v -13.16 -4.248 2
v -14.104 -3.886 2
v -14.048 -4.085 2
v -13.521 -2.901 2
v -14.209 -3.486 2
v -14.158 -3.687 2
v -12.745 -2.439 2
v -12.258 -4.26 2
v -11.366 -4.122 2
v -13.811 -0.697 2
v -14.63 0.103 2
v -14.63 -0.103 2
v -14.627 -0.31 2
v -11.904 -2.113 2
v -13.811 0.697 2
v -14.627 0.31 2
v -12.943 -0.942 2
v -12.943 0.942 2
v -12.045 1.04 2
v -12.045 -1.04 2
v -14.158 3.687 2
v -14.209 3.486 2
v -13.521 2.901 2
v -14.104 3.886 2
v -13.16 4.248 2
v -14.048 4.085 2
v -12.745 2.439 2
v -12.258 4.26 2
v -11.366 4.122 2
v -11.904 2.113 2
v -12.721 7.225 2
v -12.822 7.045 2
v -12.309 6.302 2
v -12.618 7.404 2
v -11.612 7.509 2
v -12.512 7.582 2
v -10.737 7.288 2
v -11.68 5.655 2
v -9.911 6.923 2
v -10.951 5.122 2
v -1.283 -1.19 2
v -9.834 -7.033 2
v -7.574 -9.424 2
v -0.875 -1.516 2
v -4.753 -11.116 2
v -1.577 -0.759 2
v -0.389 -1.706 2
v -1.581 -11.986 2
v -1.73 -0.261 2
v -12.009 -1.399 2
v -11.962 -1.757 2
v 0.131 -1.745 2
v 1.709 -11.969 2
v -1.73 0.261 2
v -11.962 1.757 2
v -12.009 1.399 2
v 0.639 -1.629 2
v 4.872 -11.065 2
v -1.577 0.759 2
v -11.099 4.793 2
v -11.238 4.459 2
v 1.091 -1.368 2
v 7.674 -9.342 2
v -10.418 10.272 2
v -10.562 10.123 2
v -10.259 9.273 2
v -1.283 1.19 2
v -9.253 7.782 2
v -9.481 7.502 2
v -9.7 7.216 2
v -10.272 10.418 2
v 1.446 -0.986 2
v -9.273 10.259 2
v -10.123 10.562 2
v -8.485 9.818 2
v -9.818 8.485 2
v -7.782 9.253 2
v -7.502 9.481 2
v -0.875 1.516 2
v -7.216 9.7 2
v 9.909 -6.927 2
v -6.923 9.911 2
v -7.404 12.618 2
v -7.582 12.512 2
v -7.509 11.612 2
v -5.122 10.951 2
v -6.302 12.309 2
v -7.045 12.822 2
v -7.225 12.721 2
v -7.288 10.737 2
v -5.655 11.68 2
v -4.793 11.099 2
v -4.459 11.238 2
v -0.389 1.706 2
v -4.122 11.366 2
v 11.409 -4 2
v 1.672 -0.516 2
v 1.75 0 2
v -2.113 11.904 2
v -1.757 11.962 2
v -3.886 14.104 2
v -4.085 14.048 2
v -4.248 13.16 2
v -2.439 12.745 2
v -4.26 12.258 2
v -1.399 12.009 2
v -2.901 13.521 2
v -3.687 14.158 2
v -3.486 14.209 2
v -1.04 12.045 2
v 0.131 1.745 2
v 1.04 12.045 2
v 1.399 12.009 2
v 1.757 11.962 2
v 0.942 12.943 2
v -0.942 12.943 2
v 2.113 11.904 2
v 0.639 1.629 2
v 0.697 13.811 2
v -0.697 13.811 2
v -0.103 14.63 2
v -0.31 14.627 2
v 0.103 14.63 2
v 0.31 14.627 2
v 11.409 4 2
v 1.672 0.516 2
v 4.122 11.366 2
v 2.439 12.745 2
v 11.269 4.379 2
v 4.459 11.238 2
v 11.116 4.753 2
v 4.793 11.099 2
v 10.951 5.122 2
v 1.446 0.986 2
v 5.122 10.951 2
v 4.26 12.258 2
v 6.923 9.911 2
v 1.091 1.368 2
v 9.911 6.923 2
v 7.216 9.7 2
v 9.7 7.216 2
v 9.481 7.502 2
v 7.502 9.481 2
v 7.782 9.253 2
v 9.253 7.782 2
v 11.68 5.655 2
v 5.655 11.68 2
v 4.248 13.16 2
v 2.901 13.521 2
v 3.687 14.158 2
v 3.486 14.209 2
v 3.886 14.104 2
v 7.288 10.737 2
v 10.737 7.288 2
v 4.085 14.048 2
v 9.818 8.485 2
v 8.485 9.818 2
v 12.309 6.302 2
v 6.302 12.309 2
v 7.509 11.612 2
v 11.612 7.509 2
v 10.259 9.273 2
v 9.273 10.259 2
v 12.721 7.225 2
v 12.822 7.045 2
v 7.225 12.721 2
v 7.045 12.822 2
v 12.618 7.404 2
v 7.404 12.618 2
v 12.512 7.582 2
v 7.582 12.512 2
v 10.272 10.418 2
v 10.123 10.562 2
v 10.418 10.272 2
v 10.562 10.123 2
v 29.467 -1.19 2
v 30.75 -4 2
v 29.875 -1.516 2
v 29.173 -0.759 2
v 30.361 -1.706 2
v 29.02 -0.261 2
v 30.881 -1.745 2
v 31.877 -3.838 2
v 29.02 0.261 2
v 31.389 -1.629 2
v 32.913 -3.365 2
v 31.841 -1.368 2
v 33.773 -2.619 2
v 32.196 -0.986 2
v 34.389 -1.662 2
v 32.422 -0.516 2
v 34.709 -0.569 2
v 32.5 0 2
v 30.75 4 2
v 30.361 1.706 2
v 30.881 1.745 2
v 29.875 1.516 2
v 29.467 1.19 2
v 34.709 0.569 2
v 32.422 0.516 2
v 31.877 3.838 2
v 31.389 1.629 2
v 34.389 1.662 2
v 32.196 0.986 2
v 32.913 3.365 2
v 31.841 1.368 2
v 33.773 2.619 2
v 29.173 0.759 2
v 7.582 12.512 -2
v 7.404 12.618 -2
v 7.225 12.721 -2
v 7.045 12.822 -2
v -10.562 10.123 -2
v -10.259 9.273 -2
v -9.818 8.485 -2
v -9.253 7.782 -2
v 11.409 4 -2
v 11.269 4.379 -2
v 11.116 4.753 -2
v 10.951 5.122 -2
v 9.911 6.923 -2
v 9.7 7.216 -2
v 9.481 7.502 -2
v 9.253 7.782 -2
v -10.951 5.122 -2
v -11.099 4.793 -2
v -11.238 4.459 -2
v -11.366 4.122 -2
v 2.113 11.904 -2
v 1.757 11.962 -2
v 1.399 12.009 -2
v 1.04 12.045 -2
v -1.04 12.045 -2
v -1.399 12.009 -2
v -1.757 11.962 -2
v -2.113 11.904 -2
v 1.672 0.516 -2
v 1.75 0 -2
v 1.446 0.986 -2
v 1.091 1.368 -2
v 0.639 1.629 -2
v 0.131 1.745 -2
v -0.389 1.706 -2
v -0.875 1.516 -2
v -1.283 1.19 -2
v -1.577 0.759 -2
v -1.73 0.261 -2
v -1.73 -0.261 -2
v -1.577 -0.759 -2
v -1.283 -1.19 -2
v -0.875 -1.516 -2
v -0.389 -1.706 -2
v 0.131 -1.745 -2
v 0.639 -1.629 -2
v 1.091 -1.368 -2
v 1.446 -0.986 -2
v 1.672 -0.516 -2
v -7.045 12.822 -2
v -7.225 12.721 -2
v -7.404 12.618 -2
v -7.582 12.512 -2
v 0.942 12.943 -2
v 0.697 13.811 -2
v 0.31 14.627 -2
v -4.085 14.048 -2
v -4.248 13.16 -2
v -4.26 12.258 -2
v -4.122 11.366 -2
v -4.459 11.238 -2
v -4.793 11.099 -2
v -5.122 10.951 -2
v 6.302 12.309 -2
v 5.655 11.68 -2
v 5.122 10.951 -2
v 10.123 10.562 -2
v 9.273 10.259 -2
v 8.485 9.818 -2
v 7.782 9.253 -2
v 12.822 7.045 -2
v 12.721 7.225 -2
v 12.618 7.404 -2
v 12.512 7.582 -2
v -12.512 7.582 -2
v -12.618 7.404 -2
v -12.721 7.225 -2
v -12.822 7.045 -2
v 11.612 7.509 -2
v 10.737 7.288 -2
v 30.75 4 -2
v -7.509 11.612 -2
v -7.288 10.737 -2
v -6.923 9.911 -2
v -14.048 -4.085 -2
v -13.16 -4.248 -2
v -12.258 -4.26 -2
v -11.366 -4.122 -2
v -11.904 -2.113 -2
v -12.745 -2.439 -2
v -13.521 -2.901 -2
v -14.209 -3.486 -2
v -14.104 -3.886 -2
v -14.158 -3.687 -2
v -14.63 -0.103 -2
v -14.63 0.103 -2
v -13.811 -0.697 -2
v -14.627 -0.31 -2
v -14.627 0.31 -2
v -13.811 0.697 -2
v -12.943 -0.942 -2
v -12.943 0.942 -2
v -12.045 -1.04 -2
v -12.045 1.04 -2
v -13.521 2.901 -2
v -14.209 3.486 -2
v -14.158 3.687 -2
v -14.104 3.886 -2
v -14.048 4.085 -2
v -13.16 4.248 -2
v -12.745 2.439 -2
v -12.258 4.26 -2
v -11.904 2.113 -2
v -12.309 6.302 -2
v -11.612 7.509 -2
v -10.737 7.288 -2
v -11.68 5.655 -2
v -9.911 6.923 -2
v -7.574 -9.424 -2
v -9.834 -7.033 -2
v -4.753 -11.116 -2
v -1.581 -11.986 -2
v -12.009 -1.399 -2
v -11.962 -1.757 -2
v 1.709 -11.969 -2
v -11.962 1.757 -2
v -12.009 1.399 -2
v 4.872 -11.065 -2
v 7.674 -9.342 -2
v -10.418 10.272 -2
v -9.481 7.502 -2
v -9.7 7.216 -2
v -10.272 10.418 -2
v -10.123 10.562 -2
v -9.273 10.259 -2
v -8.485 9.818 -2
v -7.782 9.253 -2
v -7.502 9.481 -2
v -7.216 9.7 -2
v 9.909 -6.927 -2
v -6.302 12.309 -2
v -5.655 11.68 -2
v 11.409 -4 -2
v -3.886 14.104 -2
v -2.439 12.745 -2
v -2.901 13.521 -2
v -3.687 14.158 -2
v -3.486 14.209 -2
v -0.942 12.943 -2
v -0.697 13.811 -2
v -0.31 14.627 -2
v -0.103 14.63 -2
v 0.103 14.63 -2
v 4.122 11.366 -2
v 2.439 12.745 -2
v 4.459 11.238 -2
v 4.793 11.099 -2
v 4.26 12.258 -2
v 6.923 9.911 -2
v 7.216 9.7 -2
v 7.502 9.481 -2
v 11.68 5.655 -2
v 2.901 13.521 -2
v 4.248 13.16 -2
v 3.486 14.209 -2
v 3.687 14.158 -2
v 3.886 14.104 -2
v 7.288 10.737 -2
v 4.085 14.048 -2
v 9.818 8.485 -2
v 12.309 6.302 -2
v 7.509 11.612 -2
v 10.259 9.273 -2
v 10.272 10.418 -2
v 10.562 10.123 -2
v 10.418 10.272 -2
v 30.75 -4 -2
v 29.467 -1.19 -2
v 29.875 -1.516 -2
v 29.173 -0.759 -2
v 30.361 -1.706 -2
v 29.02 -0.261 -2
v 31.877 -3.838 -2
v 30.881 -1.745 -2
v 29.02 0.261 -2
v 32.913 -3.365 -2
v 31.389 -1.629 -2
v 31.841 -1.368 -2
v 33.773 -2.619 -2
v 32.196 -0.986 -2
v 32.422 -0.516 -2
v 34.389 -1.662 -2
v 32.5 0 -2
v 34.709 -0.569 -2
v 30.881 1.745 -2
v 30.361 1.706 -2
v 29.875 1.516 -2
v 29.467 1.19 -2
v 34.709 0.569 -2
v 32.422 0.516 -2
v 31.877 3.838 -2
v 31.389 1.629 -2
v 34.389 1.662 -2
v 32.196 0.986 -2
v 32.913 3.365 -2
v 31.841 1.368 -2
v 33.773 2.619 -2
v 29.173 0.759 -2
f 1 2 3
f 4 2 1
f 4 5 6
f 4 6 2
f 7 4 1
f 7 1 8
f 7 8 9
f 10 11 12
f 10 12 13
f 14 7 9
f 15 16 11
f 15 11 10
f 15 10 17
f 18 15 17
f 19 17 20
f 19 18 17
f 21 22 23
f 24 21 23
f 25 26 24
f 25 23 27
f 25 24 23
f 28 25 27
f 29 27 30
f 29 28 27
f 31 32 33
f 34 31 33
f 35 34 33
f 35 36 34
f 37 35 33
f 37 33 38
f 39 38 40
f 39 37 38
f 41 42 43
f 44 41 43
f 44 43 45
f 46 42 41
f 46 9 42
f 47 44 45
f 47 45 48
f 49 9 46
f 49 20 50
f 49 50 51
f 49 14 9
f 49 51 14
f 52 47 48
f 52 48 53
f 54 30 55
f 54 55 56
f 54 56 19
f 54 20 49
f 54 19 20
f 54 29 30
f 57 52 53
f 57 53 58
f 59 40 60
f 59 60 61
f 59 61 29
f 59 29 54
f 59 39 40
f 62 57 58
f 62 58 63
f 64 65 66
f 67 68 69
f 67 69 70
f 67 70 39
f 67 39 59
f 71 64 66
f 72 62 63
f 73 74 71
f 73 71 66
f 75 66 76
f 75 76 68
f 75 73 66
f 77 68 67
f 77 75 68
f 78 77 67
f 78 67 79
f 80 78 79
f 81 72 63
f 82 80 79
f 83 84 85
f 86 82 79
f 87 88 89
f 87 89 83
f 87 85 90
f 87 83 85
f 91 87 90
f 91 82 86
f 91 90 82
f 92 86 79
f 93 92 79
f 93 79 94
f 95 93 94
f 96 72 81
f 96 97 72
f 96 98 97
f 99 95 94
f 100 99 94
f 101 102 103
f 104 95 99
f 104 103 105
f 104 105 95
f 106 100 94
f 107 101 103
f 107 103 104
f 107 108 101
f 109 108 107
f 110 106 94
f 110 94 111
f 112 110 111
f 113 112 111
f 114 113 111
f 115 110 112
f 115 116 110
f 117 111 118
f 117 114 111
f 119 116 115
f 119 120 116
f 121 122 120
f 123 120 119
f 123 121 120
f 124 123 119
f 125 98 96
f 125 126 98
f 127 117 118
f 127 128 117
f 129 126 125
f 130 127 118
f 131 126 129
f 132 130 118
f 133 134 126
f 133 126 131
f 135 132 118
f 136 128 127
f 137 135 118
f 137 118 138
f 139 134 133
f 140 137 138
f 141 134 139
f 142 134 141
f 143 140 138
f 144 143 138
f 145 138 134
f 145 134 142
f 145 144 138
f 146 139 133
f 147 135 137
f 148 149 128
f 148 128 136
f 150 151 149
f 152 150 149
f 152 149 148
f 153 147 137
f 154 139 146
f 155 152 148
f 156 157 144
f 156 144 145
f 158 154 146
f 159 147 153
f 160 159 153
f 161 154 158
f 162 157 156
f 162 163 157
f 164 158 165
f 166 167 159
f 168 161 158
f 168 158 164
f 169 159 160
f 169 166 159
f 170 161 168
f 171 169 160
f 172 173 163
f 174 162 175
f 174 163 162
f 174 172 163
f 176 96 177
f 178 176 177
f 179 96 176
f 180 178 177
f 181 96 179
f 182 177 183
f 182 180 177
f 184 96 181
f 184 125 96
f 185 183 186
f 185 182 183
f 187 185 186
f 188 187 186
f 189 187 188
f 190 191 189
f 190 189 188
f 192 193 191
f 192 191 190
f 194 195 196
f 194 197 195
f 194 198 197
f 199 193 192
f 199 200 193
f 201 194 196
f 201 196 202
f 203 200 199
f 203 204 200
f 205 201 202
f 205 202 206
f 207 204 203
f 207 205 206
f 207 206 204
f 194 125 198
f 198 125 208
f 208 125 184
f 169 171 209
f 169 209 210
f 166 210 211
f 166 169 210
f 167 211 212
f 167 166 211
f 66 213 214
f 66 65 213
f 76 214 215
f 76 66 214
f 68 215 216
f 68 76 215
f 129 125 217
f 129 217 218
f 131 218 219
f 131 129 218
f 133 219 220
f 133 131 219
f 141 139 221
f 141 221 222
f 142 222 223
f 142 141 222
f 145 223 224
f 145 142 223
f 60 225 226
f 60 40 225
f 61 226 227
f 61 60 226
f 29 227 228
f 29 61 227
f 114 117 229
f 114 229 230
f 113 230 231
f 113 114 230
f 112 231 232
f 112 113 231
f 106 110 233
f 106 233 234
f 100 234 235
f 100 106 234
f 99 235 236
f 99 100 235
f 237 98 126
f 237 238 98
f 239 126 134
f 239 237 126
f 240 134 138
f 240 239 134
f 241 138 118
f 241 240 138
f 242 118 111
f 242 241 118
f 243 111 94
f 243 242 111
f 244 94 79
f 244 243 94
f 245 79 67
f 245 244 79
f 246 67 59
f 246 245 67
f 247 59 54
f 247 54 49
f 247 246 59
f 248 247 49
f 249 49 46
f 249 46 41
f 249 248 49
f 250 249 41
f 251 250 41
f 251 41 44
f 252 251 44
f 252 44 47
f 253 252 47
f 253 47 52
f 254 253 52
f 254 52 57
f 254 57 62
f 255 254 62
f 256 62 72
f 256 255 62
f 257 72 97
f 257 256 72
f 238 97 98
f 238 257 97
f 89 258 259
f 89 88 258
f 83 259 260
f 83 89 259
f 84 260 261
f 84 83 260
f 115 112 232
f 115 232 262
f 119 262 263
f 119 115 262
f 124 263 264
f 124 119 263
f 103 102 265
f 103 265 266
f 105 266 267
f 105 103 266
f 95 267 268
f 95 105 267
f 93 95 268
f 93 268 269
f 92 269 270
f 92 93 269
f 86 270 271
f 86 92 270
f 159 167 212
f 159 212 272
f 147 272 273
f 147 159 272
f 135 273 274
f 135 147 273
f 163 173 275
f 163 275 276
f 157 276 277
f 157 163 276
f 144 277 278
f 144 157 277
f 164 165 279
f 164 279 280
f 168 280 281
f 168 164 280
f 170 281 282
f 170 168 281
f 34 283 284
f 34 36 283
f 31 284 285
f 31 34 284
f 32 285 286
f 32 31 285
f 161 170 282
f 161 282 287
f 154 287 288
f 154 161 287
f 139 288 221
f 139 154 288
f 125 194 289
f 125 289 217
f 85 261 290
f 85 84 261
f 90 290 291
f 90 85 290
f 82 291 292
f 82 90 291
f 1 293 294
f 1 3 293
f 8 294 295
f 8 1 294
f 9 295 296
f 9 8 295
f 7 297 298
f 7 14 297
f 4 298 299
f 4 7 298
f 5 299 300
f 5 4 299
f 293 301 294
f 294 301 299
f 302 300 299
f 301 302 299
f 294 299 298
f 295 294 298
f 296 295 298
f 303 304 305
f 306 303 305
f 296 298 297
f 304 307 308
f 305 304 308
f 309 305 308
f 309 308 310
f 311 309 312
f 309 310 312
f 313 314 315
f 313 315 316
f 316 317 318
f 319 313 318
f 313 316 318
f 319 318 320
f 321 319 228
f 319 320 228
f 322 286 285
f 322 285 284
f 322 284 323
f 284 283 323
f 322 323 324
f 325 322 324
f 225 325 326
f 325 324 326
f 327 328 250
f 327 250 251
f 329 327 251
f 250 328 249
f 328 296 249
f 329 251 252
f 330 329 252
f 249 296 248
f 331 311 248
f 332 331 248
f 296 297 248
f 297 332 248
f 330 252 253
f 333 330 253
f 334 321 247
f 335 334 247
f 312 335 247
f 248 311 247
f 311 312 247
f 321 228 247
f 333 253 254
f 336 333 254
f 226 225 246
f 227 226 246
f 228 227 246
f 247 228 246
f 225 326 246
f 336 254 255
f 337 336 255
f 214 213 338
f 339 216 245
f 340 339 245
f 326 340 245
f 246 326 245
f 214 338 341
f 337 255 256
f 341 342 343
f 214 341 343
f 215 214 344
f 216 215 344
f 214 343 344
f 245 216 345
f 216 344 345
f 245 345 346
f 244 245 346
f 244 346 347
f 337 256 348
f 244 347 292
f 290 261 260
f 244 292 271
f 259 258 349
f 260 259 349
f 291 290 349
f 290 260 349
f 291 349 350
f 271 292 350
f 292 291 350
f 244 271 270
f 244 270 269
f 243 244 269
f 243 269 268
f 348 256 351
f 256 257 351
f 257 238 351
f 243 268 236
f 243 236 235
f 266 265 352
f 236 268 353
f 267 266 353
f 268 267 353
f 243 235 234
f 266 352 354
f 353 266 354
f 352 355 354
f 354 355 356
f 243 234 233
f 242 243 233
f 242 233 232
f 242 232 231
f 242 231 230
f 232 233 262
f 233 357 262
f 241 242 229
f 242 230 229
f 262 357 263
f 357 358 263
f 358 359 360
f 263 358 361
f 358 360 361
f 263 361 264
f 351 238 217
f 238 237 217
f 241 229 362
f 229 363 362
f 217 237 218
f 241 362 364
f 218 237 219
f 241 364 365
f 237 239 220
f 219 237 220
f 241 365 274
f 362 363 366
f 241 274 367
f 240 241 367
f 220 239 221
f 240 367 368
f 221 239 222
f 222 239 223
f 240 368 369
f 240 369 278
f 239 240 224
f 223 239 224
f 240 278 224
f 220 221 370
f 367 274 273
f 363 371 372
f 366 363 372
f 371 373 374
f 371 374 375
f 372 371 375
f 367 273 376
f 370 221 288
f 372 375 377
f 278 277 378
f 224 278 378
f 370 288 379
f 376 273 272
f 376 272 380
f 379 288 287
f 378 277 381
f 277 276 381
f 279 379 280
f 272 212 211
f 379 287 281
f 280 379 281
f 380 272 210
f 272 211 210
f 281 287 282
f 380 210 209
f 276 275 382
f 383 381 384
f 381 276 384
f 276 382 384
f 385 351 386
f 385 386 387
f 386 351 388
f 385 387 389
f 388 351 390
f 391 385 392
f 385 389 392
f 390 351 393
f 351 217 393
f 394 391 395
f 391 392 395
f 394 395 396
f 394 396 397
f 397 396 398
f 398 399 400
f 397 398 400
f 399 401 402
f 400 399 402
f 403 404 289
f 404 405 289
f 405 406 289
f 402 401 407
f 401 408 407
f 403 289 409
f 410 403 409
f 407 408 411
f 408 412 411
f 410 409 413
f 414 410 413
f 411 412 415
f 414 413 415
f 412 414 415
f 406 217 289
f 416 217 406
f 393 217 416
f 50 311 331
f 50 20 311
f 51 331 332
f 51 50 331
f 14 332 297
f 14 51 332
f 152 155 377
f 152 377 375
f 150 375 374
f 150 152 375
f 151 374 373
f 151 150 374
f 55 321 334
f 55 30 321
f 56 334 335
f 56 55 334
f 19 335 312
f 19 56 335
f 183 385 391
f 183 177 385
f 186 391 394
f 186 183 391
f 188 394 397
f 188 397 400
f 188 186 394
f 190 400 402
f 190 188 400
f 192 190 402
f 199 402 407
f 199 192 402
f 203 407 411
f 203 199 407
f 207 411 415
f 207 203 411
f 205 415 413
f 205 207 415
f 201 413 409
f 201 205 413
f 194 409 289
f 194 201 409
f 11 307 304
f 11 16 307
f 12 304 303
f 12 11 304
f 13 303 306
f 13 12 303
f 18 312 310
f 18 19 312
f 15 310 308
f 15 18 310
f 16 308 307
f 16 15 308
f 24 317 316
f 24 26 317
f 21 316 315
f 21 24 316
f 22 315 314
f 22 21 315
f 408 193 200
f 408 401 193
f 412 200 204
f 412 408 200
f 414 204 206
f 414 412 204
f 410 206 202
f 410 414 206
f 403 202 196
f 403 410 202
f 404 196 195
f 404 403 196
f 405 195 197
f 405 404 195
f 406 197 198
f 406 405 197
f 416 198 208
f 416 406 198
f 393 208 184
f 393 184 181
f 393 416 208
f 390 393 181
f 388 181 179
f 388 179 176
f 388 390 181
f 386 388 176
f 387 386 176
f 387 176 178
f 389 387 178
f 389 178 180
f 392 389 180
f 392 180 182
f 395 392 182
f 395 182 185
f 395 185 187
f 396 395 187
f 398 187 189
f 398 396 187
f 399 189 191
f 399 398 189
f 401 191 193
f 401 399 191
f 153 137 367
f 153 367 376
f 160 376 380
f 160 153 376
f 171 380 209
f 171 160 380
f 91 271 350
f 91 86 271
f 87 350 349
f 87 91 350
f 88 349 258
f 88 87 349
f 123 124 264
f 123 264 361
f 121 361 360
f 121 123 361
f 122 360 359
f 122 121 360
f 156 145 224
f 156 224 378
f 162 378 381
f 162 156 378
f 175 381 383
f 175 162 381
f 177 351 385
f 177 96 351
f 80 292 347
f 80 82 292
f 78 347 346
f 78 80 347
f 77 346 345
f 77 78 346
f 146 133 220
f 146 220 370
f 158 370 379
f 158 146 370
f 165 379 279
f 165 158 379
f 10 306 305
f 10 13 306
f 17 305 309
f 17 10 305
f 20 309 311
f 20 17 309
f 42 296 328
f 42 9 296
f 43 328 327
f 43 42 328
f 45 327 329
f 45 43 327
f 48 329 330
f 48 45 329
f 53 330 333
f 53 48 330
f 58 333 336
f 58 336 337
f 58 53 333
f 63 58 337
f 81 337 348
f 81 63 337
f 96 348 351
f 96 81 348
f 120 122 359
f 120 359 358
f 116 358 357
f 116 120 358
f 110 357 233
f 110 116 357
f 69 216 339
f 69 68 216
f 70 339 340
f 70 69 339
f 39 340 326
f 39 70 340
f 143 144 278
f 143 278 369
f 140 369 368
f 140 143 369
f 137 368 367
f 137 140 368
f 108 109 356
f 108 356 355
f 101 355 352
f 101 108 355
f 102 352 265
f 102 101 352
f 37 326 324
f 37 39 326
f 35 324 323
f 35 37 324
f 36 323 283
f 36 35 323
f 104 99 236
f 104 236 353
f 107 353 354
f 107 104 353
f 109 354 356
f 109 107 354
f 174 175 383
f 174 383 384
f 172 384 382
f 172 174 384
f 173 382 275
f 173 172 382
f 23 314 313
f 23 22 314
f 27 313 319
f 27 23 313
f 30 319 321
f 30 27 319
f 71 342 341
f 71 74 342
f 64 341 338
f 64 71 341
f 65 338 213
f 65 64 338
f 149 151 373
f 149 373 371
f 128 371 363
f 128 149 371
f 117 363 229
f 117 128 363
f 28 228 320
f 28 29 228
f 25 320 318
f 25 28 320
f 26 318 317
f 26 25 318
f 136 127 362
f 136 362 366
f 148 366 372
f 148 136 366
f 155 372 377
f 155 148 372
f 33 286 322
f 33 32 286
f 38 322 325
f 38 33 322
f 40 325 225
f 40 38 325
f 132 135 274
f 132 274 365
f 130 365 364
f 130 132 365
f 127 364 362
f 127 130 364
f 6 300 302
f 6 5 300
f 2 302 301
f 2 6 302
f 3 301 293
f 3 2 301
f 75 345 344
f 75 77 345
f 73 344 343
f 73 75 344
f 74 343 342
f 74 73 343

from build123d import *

# Parameters (mm, degrees)
ESQUISSE1_R        = 1.75
BOSS_EXTRU_1_DEPTH = 2


with BuildPart() as part:
    # Esquisse1 → Boss.-Extru.1 (new body, symmetric)
    with BuildSketch(Plane.XY):
        with BuildLine():
            ThreePointArc((30.75, -4), (34.75, 0), (30.75, 4))
            Line((30.75, 4), (11.409123542, 4))
            ThreePointArc((11.409123542, 4), (11.194344337, 4.566700654), (10.951436862, 5.12192646))
            ThreePointArc((10.951436862, 5.12192646), (12.008090957, 5.965388247), (12.82210701, 7.044889767))
            ThreePointArc((12.82210701, 7.044889767), (12.669951657, 7.315), (12.51210701, 7.581825517))
            ThreePointArc((12.51210701, 7.581825517), (11.170223244, 7.416617696), (9.911436862, 6.9232593))
            ThreePointArc((9.911436862, 6.9232593), (9.591641884, 7.359925677), (9.252623584, 7.781841479))
            ThreePointArc((9.252623584, 7.781841479), (10.05496909, 8.870045207), (10.561852666, 10.123446462))
            ThreePointArc((10.561852666, 10.123446462), (10.344972209, 10.344972209), (10.123446462, 10.561852666))
            ThreePointArc((10.123446462, 10.561852666), (8.870045207, 10.05496909), (7.781841479, 9.252623584))
            ThreePointArc((7.781841479, 9.252623584), (7.359925677, 9.591641884), (6.9232593, 9.911436862))
            ThreePointArc((6.9232593, 9.911436862), (7.416617696, 11.170223244), (7.581825517, 12.51210701))
            ThreePointArc((7.581825517, 12.51210701), (7.315, 12.669951657), (7.044889767, 12.82210701))
            ThreePointArc((7.044889767, 12.82210701), (5.965388247, 12.008090957), (5.12192646, 10.951436862))
            ThreePointArc((5.12192646, 10.951436862), (4.626642697, 11.169703548), (4.122086336, 11.365584201))
            ThreePointArc((4.122086336, 11.365584201), (4.272836063, 12.709169027), (4.085109489, 14.048088143))
            ThreePointArc((4.085109489, 14.048088143), (3.78652263, 14.131494839), (3.486235477, 14.208555951))
            ThreePointArc((3.486235477, 14.208555951), (2.654199937, 13.14288127), (2.112960617, 11.903927815))
            ThreePointArc((2.112960617, 11.903927815), (1.578061664, 11.986568374), (1.04, 12.04518576))
            ThreePointArc((1.04, 12.04518576), (0.837867713, 13.382005944), (0.31, 14.626715284))
            ThreePointArc((0.31, 14.626715284), (0, 14.63), (-0.31, 14.626715284))
            ThreePointArc((-0.31, 14.626715284), (-0.837867713, 13.382005944), (-1.04, 12.04518576))
            ThreePointArc((-1.04, 12.04518576), (-1.578061664, 11.986568374), (-2.112960617, 11.903927815))
            ThreePointArc((-2.112960617, 11.903927815), (-2.654199937, 13.14288127), (-3.486235477, 14.208555951))
            ThreePointArc((-3.486235477, 14.208555951), (-3.78652263, 14.131494839), (-4.085109489, 14.048088143))
            ThreePointArc((-4.085109489, 14.048088143), (-4.272836063, 12.709169027), (-4.122086336, 11.365584201))
            ThreePointArc((-4.122086336, 11.365584201), (-4.626642697, 11.169703548), (-5.12192646, 10.951436862))
            ThreePointArc((-5.12192646, 10.951436862), (-5.965388247, 12.008090957), (-7.044889767, 12.82210701))
            ThreePointArc((-7.044889767, 12.82210701), (-7.315, 12.669951657), (-7.581825517, 12.51210701))
            ThreePointArc((-7.581825517, 12.51210701), (-7.416617696, 11.170223244), (-6.9232593, 9.911436862))
            ThreePointArc((-6.9232593, 9.911436862), (-7.359925677, 9.591641884), (-7.781841479, 9.252623584))
            ThreePointArc((-7.781841479, 9.252623584), (-8.870045207, 10.05496909), (-10.123446462, 10.561852666))
            ThreePointArc((-10.123446462, 10.561852666), (-10.344972209, 10.344972209), (-10.561852666, 10.123446462))
            ThreePointArc((-10.561852666, 10.123446462), (-10.05496909, 8.870045207), (-9.252623584, 7.781841479))
            ThreePointArc((-9.252623584, 7.781841479), (-9.591641884, 7.359925677), (-9.911436862, 6.9232593))
            ThreePointArc((-9.911436862, 6.9232593), (-11.170223244, 7.416617696), (-12.51210701, 7.581825517))
            ThreePointArc((-12.51210701, 7.581825517), (-12.669951657, 7.315), (-12.82210701, 7.044889767))
            ThreePointArc((-12.82210701, 7.044889767), (-12.008090957, 5.965388247), (-10.951436862, 5.12192646))
            ThreePointArc((-10.951436862, 5.12192646), (-11.169703548, 4.626642697), (-11.365584201, 4.122086336))
            ThreePointArc((-11.365584201, 4.122086336), (-12.709169027, 4.272836063), (-14.048088143, 4.085109489))
            ThreePointArc((-14.048088143, 4.085109489), (-14.131494839, 3.78652263), (-14.208555951, 3.486235477))
            ThreePointArc((-14.208555951, 3.486235477), (-13.14288127, 2.654199937), (-11.903927815, 2.112960617))
            ThreePointArc((-11.903927815, 2.112960617), (-11.986568374, 1.578061664), (-12.04518576, 1.04))
            ThreePointArc((-12.04518576, 1.04), (-13.382005944, 0.837867713), (-14.626715284, 0.31))
            ThreePointArc((-14.626715284, 0.31), (-14.63, 0), (-14.626715284, -0.31))
            ThreePointArc((-14.626715284, -0.31), (-13.382005944, -0.837867713), (-12.04518576, -1.04))
            ThreePointArc((-12.04518576, -1.04), (-11.986568374, -1.578061664), (-11.903927815, -2.112960617))
            ThreePointArc((-11.903927815, -2.112960617), (-13.14288127, -2.654199937), (-14.208555951, -3.486235477))
            ThreePointArc((-14.208555951, -3.486235477), (-14.131494839, -3.78652263), (-14.048088143, -4.085109489))
            ThreePointArc((-14.048088143, -4.085109489), (-12.709169027, -4.272836063), (-11.365584201, -4.122086336))
            ThreePointArc((-11.365584201, -4.122086336), (0.064808849, -12.089826294), (11.409123542, -4))
            Line((11.409123542, -4), (30.75, -4))
        make_face()
        with Locations((30.75, 0)):
            Circle(ESQUISSE1_R, mode=Mode.SUBTRACT)
        Circle(ESQUISSE1_R, mode=Mode.SUBTRACT)
    extrude(amount=BOSS_EXTRU_1_DEPTH, both=True)


solid = part.part
